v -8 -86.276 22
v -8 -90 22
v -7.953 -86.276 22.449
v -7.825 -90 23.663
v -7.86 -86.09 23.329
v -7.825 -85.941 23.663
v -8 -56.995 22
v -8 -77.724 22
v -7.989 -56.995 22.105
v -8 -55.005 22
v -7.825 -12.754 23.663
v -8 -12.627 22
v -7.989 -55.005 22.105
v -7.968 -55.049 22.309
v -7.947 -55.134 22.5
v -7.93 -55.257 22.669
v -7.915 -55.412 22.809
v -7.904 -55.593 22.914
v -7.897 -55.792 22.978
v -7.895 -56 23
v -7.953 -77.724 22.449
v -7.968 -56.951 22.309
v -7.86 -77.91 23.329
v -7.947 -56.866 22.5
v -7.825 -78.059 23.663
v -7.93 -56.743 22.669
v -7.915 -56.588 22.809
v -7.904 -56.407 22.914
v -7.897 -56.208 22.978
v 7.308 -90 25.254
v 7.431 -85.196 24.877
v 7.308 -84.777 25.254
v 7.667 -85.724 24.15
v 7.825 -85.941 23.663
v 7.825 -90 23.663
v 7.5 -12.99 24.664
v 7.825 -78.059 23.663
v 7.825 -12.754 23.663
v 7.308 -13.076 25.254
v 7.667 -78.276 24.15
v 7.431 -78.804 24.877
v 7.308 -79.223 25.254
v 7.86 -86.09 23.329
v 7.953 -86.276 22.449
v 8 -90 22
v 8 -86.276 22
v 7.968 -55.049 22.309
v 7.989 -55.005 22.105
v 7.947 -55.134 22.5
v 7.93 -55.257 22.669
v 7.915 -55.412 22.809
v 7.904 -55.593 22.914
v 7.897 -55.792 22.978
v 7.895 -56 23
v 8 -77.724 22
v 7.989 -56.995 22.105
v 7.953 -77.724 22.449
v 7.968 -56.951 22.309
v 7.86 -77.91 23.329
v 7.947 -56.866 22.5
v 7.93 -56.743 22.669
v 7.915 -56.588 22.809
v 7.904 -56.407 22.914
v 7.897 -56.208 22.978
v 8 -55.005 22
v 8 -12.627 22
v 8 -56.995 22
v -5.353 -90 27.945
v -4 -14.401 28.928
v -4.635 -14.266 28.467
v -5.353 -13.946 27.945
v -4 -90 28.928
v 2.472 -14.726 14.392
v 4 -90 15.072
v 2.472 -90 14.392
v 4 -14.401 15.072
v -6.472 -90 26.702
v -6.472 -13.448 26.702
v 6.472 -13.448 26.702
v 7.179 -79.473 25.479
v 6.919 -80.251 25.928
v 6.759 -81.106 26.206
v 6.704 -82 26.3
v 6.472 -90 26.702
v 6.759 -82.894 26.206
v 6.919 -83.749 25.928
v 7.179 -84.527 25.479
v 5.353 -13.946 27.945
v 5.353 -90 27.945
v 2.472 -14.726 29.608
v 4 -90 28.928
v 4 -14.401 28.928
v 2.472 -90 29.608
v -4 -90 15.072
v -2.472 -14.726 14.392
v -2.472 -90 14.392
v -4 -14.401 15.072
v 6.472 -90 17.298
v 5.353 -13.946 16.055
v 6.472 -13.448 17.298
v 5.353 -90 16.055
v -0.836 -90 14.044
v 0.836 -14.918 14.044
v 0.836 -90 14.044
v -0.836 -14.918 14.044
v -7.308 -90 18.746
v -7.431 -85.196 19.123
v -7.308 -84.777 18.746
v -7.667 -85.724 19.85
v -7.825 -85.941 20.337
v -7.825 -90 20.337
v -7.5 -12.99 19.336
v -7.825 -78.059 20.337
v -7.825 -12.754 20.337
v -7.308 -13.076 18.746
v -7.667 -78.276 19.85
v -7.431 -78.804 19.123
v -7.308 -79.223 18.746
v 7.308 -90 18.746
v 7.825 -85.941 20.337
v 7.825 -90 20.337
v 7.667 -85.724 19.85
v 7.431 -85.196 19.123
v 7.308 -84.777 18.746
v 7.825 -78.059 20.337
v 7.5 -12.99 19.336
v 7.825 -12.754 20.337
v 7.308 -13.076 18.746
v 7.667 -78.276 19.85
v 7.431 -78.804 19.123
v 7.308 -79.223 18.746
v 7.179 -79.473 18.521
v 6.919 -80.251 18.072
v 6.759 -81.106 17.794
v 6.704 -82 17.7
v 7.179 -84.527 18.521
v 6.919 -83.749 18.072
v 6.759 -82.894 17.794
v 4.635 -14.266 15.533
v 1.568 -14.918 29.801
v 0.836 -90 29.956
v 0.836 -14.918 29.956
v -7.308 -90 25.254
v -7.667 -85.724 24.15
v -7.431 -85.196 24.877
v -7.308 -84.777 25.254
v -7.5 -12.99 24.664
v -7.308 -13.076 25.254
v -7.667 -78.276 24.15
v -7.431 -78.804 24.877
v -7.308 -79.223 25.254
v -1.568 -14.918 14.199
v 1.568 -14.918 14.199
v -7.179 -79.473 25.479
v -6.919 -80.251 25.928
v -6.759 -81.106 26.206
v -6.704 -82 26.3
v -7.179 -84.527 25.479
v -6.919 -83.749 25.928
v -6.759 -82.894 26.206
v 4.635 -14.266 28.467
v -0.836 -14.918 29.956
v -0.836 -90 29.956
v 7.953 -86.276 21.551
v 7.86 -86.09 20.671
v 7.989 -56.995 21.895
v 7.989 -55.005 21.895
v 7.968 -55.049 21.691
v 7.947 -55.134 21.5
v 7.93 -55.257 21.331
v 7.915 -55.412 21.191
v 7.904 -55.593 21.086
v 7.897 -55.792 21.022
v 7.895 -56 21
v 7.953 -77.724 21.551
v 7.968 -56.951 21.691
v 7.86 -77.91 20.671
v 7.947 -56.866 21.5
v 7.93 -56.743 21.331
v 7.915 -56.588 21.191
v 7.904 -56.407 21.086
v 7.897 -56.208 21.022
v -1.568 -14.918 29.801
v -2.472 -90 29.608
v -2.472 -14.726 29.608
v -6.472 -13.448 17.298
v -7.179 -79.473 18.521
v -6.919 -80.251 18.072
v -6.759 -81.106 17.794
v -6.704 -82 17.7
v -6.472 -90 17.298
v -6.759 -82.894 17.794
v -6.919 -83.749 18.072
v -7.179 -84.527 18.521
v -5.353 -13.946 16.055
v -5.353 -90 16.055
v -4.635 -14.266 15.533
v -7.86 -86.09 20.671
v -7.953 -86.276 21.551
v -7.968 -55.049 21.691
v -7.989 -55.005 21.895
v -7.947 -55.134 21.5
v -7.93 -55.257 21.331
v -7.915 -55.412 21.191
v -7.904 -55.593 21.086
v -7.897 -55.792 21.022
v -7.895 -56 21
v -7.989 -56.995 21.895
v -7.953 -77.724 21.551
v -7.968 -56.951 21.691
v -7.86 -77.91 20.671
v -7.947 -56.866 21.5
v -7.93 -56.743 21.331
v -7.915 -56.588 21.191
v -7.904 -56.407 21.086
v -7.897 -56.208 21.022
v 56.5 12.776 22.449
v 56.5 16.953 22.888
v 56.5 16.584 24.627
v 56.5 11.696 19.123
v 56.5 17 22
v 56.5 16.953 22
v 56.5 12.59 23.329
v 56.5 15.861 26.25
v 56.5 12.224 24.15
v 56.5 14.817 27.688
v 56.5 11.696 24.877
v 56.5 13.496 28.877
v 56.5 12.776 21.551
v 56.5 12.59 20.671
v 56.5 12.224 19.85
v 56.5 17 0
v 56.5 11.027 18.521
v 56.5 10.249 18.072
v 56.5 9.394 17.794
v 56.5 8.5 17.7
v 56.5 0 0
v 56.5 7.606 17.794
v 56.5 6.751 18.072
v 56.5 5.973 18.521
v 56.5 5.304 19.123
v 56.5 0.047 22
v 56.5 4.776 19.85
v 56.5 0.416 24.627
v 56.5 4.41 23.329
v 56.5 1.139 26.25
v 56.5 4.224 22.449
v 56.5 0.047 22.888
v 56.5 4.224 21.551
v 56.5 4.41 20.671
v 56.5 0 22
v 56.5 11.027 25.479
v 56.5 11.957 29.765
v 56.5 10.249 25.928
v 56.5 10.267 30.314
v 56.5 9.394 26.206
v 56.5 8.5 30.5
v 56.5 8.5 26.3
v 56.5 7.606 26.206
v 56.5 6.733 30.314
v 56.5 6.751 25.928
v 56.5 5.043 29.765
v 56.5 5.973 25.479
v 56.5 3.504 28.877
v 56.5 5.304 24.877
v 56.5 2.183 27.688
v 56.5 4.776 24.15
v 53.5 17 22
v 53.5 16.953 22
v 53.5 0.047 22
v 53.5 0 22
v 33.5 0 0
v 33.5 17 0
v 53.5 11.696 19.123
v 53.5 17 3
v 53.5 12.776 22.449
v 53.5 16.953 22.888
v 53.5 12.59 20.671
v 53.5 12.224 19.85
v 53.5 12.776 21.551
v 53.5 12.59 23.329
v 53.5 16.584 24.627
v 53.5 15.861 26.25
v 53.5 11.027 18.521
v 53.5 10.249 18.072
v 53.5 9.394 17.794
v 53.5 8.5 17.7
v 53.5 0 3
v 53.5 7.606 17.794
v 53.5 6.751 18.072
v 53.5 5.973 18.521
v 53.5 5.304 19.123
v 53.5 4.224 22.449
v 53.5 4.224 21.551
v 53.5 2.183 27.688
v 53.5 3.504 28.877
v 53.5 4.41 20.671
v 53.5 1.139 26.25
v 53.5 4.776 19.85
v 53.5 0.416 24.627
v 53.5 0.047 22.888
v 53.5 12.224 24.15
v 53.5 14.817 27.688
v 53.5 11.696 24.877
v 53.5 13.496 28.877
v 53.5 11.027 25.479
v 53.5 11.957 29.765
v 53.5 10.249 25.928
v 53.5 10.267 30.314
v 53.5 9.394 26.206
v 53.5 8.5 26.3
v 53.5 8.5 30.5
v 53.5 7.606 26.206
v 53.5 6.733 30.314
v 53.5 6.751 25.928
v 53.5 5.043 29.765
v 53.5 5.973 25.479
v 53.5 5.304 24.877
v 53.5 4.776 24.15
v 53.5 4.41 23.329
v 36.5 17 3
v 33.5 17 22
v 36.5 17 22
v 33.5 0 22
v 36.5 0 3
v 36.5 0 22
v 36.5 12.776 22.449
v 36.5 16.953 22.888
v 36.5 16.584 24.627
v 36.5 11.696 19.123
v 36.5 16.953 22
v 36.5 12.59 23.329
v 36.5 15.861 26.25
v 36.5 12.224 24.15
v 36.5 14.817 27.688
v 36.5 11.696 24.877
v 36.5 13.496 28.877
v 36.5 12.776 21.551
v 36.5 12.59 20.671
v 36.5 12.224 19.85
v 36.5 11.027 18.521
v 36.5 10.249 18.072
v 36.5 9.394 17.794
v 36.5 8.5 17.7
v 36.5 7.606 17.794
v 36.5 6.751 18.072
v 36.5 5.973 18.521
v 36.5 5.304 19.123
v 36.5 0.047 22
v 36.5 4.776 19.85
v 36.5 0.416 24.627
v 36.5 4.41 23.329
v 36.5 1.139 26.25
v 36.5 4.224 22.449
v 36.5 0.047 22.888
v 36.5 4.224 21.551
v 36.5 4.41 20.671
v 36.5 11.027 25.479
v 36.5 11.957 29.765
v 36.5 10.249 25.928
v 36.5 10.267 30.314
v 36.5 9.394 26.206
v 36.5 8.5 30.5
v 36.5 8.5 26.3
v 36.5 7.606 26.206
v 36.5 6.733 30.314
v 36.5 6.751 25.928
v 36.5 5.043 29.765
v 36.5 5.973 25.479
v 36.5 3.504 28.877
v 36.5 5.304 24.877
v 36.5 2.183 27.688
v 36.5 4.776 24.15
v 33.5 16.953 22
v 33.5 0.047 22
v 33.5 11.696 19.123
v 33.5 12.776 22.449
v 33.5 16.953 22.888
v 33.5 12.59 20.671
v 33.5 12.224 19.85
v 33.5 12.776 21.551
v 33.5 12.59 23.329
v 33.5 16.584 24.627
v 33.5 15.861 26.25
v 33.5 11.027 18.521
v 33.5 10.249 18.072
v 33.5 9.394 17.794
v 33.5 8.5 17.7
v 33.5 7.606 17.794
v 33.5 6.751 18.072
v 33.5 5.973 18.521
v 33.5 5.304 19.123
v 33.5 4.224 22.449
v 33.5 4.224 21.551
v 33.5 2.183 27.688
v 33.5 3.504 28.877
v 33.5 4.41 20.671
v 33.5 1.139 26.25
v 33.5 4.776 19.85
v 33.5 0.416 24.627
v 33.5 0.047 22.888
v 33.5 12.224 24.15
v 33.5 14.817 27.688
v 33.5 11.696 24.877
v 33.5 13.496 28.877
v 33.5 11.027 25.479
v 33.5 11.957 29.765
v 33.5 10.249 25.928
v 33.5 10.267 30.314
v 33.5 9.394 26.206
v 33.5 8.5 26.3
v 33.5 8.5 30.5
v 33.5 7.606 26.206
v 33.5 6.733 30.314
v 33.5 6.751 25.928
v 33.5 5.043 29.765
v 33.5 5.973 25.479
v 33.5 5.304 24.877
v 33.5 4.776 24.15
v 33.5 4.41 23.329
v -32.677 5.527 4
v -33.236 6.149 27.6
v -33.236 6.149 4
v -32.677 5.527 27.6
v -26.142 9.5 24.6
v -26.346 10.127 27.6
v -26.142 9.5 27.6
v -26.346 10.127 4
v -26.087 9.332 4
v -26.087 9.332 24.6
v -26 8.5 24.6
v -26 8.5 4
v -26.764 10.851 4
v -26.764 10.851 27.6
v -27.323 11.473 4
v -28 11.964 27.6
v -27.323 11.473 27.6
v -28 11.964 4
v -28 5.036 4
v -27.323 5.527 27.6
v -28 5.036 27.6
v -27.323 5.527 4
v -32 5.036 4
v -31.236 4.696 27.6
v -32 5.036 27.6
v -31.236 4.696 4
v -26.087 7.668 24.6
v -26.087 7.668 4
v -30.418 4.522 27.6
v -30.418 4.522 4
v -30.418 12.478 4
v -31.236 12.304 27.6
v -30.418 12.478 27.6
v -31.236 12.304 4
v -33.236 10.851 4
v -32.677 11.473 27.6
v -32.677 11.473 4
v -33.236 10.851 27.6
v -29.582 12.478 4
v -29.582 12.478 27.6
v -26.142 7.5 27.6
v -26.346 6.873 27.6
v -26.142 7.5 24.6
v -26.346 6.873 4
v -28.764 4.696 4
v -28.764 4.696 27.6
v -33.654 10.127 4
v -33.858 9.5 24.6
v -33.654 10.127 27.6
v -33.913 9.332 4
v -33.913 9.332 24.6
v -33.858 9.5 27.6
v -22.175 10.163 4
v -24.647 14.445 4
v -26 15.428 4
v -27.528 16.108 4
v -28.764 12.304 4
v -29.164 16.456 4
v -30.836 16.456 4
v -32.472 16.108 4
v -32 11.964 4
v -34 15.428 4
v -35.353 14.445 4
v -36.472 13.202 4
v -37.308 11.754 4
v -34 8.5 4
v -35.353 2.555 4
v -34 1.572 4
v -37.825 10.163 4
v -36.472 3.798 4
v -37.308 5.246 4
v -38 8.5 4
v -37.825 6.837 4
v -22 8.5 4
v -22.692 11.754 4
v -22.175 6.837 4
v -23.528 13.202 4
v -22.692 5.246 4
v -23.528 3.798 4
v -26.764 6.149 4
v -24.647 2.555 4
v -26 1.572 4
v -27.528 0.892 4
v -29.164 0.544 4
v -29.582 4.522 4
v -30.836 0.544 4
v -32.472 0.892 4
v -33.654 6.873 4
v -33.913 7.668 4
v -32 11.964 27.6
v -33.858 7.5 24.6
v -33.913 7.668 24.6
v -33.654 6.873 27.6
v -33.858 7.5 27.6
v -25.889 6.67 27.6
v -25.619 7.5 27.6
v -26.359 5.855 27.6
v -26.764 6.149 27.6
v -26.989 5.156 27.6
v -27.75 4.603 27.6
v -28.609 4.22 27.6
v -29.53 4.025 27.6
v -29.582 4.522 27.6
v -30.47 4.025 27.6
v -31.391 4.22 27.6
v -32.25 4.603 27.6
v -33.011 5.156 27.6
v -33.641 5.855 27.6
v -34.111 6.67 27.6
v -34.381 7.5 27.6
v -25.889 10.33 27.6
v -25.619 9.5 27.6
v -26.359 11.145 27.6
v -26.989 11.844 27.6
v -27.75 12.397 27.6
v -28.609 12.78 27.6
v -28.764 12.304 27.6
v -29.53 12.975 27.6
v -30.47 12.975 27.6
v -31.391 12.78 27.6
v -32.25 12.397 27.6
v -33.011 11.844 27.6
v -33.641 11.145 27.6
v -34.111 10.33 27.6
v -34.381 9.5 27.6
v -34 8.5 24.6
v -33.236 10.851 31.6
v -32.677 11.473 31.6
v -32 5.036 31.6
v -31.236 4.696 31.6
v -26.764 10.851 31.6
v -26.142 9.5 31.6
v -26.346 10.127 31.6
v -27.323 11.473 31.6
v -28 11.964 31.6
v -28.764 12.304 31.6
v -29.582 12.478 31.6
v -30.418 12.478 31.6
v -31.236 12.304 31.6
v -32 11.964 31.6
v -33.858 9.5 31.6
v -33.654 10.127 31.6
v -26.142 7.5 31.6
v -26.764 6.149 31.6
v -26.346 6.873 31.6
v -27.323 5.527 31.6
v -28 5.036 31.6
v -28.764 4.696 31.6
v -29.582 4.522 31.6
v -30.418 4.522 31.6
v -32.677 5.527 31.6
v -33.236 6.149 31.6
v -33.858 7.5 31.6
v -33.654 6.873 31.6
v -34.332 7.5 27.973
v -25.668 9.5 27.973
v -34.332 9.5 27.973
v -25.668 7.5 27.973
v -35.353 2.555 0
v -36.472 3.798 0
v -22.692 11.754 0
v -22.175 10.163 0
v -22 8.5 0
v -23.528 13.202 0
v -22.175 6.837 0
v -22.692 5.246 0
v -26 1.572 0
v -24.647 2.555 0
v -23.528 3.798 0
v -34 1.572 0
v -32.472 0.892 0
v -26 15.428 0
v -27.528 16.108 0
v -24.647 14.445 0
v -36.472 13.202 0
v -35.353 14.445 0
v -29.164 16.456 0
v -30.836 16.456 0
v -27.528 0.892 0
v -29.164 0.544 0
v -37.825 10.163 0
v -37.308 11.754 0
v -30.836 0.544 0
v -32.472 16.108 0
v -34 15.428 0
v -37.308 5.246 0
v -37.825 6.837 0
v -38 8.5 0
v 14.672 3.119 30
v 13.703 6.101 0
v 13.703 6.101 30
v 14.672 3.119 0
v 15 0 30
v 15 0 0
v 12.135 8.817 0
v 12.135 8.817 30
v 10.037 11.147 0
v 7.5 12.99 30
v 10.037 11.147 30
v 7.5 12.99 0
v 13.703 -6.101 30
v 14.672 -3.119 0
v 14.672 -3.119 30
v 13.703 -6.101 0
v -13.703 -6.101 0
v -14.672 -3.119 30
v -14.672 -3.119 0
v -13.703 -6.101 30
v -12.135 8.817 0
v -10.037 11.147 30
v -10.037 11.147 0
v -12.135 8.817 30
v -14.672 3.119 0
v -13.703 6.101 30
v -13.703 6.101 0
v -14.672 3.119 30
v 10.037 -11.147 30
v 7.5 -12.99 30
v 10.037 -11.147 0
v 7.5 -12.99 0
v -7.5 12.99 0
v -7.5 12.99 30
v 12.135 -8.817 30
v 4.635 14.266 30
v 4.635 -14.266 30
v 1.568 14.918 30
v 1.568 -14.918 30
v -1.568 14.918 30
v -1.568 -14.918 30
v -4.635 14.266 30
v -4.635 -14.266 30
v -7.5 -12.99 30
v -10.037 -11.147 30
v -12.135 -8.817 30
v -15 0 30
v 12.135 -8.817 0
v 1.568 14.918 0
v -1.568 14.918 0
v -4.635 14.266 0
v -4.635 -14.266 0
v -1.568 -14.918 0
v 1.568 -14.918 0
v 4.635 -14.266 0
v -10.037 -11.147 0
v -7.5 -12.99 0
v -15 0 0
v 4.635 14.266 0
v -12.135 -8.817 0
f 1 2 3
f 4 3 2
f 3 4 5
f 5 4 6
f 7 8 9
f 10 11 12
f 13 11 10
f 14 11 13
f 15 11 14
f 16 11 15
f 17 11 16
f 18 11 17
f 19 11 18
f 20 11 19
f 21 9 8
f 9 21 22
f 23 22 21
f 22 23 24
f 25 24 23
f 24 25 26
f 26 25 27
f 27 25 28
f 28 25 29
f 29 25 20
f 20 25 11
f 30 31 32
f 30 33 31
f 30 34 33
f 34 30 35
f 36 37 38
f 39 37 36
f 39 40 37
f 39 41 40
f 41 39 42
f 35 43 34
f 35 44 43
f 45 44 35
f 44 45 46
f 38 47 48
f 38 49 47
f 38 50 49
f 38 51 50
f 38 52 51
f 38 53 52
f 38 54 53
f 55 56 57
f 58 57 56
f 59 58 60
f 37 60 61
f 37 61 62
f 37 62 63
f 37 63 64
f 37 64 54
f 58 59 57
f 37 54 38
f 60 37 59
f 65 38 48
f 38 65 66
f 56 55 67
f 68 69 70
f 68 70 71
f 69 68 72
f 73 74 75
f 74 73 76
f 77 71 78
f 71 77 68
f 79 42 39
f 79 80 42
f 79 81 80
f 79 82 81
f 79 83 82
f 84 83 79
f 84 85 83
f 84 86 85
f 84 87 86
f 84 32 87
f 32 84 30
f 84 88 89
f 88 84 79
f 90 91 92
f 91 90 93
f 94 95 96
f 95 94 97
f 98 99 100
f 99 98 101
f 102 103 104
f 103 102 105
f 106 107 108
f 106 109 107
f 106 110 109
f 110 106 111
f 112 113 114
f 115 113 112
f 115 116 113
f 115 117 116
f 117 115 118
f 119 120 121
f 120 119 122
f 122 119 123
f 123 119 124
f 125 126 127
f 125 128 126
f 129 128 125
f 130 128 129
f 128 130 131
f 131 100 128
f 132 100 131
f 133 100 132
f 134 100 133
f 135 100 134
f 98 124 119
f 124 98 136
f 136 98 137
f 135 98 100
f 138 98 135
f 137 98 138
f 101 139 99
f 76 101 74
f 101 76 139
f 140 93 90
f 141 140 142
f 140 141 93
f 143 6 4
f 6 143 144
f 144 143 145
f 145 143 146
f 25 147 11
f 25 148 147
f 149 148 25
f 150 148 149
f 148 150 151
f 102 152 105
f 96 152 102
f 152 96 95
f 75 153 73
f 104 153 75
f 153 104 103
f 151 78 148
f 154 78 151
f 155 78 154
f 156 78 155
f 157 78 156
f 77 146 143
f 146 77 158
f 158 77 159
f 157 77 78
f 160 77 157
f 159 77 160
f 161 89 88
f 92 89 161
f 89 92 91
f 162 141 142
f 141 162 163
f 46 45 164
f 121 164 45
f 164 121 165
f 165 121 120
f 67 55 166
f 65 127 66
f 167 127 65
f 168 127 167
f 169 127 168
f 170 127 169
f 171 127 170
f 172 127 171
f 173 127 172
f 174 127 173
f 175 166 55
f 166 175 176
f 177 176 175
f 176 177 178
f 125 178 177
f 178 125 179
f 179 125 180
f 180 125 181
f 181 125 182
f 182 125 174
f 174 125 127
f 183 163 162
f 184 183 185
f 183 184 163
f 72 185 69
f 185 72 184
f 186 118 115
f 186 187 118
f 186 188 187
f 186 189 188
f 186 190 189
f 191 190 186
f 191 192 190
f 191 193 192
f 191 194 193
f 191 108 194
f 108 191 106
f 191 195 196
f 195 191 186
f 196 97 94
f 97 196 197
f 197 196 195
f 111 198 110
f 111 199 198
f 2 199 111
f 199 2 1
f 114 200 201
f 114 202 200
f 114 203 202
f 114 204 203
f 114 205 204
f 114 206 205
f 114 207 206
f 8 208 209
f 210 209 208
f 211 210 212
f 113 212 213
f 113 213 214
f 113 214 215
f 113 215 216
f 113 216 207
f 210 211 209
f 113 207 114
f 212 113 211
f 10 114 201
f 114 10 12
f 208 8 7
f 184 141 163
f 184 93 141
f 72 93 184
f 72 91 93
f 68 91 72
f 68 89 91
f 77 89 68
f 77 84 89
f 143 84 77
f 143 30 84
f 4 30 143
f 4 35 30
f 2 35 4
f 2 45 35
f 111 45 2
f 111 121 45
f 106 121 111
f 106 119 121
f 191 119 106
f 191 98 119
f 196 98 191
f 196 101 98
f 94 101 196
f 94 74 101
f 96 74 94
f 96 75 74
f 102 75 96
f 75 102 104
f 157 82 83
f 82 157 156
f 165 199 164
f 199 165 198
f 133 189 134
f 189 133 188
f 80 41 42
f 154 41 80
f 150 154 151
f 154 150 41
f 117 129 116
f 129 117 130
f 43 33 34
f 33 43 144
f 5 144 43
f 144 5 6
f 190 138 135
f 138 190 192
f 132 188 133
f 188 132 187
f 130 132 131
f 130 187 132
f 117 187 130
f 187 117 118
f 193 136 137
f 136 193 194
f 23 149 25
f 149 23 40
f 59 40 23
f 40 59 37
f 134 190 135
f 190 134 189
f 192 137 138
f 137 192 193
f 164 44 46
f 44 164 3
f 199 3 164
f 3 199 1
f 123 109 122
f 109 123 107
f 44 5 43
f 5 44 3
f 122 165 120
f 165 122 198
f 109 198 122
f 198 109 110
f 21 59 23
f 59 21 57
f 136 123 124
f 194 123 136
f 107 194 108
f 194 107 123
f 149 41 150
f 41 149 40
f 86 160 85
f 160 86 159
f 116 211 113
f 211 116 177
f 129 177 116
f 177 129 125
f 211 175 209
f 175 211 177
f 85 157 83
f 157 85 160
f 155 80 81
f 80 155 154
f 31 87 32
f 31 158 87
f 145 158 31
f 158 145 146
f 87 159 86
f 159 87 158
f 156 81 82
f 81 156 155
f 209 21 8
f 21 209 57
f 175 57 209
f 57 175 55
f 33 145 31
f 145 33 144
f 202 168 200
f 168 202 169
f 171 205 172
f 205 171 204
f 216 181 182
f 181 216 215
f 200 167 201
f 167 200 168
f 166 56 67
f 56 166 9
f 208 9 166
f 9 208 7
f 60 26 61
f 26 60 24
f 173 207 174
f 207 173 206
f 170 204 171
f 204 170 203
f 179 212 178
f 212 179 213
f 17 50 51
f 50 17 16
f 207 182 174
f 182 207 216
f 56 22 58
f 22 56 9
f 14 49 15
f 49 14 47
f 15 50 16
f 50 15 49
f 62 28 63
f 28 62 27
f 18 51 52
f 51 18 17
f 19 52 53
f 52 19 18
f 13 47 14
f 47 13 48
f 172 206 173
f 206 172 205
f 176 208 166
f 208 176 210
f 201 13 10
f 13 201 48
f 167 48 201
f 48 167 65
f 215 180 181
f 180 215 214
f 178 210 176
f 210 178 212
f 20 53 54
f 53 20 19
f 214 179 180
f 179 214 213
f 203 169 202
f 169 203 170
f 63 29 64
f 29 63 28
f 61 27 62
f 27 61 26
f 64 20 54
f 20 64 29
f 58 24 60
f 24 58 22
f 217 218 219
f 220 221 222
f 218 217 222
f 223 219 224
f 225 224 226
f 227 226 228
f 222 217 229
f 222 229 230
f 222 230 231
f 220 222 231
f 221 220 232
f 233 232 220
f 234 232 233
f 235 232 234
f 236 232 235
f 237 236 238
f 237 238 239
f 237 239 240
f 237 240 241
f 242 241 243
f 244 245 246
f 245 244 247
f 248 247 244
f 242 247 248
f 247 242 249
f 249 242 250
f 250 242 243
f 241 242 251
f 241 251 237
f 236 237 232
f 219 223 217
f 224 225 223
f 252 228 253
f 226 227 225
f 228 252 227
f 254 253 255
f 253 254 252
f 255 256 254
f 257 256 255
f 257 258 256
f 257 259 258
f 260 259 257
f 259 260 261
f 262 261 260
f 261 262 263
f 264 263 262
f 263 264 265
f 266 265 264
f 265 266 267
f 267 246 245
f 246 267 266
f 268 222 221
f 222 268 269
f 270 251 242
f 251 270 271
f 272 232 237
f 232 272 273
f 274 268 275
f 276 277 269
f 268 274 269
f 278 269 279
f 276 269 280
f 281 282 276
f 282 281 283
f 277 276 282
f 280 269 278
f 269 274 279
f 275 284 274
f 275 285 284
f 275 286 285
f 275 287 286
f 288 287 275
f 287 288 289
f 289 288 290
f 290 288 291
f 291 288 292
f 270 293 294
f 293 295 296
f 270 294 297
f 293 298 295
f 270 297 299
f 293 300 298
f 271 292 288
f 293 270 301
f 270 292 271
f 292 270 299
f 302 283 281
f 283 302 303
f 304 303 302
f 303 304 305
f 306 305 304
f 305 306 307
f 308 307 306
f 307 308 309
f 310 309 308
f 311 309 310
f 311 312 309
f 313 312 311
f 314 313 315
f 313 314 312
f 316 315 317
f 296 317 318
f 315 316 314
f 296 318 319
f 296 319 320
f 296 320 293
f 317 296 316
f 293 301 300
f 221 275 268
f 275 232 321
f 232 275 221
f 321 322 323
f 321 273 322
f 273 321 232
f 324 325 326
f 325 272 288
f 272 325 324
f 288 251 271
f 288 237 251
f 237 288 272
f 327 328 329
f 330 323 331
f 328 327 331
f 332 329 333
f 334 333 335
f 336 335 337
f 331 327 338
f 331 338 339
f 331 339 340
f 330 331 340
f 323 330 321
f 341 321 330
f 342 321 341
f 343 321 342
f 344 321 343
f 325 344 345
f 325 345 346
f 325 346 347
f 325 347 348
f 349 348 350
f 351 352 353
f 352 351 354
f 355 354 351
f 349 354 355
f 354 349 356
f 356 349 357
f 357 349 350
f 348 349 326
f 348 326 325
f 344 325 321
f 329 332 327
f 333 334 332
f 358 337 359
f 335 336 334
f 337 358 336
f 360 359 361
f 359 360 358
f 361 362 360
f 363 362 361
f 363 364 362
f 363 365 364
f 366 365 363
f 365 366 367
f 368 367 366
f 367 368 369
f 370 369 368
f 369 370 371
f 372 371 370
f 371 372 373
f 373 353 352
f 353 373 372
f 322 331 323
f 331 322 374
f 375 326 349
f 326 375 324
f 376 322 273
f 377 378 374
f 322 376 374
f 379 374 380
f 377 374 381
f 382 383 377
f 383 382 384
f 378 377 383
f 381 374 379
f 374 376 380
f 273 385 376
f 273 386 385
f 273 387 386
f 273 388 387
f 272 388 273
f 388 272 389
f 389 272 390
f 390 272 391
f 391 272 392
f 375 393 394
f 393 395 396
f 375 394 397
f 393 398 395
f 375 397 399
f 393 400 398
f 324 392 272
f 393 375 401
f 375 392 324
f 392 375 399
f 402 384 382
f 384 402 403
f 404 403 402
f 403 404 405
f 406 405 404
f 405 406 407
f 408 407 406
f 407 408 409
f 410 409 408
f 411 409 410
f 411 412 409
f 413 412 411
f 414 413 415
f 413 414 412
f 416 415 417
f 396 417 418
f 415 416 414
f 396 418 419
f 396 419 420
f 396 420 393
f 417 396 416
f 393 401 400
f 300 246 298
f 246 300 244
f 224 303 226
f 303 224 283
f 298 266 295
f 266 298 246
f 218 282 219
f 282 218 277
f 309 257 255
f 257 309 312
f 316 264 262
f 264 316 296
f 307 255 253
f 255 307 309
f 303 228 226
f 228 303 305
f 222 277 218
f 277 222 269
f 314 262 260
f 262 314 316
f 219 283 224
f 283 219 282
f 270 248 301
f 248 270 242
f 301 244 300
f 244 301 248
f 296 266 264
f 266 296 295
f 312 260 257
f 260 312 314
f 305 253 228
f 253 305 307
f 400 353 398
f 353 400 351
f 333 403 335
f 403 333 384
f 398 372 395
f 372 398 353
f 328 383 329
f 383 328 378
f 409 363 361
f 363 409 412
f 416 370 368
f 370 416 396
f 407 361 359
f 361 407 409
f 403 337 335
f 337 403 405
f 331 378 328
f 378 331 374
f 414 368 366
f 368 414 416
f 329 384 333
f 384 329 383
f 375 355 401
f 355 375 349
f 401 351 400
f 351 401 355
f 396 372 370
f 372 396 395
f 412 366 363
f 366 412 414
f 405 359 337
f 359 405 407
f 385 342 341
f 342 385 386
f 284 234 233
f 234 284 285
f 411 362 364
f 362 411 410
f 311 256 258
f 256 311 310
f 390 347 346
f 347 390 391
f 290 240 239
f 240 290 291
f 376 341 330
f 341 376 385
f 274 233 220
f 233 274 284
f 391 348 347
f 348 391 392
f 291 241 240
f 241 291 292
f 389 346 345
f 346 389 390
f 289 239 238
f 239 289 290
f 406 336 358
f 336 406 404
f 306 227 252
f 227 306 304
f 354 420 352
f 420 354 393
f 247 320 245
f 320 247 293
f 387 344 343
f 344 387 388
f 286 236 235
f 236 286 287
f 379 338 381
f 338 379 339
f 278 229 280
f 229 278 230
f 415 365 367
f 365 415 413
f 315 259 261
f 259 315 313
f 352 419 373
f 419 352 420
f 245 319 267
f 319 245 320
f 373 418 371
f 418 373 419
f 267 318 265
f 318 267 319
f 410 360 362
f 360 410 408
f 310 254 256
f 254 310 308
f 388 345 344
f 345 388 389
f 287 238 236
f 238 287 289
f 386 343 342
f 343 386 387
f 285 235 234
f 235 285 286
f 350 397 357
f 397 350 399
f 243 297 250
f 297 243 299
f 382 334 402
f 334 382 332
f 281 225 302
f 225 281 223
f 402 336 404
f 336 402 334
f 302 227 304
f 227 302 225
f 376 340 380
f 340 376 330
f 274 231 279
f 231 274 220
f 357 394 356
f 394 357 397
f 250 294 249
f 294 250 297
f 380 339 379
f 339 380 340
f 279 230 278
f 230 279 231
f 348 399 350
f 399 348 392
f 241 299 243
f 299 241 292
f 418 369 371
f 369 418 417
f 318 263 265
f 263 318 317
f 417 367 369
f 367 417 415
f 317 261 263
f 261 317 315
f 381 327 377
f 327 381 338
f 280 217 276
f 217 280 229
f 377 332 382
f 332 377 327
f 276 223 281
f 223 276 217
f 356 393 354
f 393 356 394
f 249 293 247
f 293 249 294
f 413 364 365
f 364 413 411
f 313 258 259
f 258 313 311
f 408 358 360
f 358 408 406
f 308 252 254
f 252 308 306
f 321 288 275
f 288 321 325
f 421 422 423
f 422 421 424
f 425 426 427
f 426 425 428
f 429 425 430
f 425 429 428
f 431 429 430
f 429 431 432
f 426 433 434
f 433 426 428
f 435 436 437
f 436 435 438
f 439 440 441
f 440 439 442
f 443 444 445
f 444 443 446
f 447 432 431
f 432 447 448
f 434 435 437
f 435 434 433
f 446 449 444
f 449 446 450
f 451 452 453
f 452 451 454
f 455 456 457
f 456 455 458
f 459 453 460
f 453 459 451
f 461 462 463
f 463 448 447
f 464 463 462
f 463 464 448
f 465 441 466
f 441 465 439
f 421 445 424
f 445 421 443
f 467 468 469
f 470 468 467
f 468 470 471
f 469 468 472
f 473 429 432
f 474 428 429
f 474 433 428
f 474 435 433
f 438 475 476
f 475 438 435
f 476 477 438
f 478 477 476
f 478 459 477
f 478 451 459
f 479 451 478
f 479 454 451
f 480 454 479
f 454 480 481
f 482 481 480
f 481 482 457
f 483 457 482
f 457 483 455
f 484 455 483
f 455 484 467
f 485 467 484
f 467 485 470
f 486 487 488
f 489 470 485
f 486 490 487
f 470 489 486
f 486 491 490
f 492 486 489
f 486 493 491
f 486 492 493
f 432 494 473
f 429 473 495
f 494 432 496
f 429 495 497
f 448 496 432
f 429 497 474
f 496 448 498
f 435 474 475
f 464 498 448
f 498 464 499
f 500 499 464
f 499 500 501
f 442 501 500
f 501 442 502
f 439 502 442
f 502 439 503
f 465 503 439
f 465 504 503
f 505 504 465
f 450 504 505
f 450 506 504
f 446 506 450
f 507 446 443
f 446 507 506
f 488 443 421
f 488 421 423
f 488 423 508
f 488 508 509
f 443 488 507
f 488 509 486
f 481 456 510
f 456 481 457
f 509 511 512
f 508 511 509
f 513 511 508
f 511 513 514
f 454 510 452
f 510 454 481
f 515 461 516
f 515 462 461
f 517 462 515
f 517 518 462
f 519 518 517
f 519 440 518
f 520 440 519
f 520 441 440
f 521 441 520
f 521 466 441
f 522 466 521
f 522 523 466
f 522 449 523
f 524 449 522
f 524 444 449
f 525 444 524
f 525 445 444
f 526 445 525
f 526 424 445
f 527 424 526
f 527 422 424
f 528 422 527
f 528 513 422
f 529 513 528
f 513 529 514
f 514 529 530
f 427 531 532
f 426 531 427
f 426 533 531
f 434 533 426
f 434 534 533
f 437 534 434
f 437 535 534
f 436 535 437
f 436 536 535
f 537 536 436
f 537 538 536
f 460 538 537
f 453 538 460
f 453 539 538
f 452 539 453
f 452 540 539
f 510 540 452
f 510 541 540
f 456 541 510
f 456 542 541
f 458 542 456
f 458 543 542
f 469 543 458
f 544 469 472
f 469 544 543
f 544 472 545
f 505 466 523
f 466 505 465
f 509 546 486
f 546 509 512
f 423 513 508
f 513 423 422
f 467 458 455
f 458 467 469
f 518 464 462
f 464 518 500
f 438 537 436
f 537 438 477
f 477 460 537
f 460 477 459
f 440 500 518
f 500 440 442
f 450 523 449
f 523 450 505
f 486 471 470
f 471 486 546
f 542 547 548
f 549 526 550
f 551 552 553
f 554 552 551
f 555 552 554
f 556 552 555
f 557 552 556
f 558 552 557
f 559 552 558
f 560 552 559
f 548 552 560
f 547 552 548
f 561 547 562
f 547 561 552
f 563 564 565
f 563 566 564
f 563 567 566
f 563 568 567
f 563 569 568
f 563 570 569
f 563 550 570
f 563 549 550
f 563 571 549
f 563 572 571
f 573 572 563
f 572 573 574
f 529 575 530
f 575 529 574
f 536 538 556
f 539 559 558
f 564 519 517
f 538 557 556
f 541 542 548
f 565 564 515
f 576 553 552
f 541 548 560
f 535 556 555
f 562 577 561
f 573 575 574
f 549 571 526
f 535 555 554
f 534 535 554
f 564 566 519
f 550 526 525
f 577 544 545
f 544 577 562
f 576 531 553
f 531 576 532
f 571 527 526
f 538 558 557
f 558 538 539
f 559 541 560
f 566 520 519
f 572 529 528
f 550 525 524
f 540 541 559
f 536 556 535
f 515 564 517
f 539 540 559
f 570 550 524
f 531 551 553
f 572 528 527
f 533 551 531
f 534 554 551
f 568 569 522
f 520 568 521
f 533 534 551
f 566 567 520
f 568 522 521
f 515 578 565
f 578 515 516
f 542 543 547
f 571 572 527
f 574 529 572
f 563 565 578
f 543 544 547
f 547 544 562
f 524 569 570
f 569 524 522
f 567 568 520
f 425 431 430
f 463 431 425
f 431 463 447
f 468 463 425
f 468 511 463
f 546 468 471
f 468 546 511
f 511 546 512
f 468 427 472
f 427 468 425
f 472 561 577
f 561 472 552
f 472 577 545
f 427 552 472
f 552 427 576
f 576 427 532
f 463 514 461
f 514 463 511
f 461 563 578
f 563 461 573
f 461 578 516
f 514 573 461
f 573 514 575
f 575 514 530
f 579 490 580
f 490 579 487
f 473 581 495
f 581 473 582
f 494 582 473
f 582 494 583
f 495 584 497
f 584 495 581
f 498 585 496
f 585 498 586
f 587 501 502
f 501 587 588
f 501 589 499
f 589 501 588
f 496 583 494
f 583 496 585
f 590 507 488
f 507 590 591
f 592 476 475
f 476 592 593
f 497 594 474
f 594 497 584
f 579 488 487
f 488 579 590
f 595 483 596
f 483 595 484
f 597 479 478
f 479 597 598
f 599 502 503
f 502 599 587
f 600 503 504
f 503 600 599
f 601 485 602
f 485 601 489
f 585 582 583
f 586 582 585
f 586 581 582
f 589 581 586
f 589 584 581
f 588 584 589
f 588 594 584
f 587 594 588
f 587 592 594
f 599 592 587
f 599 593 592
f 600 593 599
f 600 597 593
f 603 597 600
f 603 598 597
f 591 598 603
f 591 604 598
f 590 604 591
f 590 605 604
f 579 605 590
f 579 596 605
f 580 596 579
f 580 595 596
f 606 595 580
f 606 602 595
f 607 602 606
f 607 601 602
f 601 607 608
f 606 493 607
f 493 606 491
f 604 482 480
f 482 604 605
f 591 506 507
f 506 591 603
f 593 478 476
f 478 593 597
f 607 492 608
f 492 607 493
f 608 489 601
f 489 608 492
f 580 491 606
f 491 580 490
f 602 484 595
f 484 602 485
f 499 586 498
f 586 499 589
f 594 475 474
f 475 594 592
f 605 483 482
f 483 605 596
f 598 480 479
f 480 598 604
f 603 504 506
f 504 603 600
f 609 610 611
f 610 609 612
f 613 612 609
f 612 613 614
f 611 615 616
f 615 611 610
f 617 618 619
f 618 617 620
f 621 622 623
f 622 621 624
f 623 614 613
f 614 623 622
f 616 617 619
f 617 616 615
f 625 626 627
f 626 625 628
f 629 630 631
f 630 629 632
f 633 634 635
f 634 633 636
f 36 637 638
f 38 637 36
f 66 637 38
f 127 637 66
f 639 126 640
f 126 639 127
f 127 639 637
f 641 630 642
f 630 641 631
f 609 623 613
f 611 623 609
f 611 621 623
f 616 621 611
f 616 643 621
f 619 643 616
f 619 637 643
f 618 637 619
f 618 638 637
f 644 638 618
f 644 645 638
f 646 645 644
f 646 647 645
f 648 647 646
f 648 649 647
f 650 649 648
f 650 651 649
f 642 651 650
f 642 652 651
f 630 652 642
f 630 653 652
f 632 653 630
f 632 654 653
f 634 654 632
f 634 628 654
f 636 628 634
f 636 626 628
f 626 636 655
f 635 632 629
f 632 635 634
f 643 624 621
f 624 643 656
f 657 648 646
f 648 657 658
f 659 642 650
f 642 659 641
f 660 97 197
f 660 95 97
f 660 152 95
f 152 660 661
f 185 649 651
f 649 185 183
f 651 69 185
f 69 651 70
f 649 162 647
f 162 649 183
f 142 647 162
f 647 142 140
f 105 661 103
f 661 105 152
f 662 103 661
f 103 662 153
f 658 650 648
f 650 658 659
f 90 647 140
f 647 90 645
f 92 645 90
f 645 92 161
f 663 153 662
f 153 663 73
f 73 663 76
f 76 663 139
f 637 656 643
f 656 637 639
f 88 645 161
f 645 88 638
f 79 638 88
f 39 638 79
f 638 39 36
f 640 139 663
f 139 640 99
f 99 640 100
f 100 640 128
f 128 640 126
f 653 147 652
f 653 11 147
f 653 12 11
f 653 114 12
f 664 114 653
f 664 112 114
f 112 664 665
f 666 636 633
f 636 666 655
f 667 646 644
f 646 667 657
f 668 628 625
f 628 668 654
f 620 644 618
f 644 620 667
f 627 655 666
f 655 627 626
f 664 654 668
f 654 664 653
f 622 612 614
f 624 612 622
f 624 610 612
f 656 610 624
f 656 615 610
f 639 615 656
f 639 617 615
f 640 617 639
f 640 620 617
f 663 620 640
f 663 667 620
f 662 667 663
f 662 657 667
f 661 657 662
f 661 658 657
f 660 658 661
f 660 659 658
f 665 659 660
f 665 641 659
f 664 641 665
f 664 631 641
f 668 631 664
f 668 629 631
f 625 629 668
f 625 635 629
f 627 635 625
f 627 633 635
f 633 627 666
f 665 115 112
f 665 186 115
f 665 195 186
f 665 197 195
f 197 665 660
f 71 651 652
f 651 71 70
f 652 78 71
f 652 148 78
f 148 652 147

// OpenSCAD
$fn=30;
handle_r = 8;
handle_l = 90;
head_r = 15;
head_l = 30;
pin_r = 4;
pin_rtol = 0.3;   // gap between pin and the hole
pin_ltol = 0.3;  // gap betwen the pin ends and the hinge
pin_head_r = pin_r * 2;
pin_head_l = 4;
hinge_t = 3;
hinge_tol = 0.5; // gap between the hinge and the handle
servo_arm_l = 13;
drive_hole_r = 1;
barb_l = 4;
barb_r = 0.2;
slot_t = 2;
slot_l = barb_l + 3;

explode = 1;  //  set to 1 to print, 0 to see assembly

diff_tol = 1; // tolerance for diff operations

pin_l = handle_r*2 + hinge_tol*2 + hinge_t * 2 + pin_ltol*2;  // just the shaft part
pin_offset = pin_r * 2;
handle_z = head_l-handle_r;
pin_y = -handle_l + pin_offset;

/***** hammer *****/
// head
cylinder( r = head_r, h = head_l);
// handle
difference() {
    // handle itself
    translate( [0, 0, handle_z ] )                             rotate( [90,0,0])  cylinder( r = handle_r, h = handle_l);
    // hold for pin
    translate( [-pin_l/2, pin_y, handle_z] )                   rotate( [0,90,0] ) cylinder( r=pin_r+pin_rtol, h=pin_l);
    // drive hole
    translate( [-pin_l/2, pin_y + servo_arm_l * 2, handle_z] ) rotate( [0,90,0] ) cylinder( r=drive_hole_r, h=pin_l);
    
}

/**** hinge ****/
hinge_w = handle_r*2 + hinge_tol * 2;  // inner
hinge_y = pin_y - hinge_w /2 ;
color("blue") translate( [explode*head_r*3 - hinge_w/2, (1-explode) * hinge_y,0 ] ) {
                                                                             cube([hinge_w,hinge_w,hinge_t]);
    //difference() {
    difference() {
        union() {
            translate( [hinge_w, 0,0])                                       cube( [hinge_t, hinge_w, handle_z] );
            translate( [-hinge_t, 0,0])                                      cube( [hinge_t, hinge_w, handle_z] );
            translate( [hinge_w, hinge_w/2, handle_z] )  rotate( [0,90,0])   cylinder( r=hinge_w/2, h=hinge_t);
            translate( [-hinge_t, hinge_w/2, handle_z] ) rotate( [0,90,0])   cylinder( r=hinge_w/2, h=hinge_t);
        }
        translate( [-hinge_t, hinge_w/2, handle_z] )     rotate( [0,90,0])   cylinder( r=pin_r + pin_rtol, h=pin_l);
    }
}


/**** pin ****/
translate( [ -explode*head_r*2 + (1-explode) * -(pin_l/2 + pin_head_l ), (1-explode) * hinge_y + hinge_w/2, (1-explode)*handle_z] ) rotate( [0, 90*(1-explode), 0] )  {
    // pin head
    cylinder( r=pin_head_r, h=pin_head_l) sphere( r=0.5);
    difference() {
        union() {
            // pin shaft
            translate( [ 0,0, pin_head_l] ) cylinder( r=pin_r, h=pin_l) sphere( 0.5);
            // pin barb
            translate( [0,0,pin_head_l + pin_l] ) cylinder( r1=pin_r+barb_r+pin_rtol, r2=pin_r,h=barb_l );
        }
        // slot
        translate( [-pin_r-barb_r-pin_rtol,-slot_t/2, pin_l+pin_head_l+barb_l-slot_l]) color("red") cube( [pin_r*2+barb_r*2+pin_rtol*2, slot_t, slot_l] ) ;
    }
    
}
